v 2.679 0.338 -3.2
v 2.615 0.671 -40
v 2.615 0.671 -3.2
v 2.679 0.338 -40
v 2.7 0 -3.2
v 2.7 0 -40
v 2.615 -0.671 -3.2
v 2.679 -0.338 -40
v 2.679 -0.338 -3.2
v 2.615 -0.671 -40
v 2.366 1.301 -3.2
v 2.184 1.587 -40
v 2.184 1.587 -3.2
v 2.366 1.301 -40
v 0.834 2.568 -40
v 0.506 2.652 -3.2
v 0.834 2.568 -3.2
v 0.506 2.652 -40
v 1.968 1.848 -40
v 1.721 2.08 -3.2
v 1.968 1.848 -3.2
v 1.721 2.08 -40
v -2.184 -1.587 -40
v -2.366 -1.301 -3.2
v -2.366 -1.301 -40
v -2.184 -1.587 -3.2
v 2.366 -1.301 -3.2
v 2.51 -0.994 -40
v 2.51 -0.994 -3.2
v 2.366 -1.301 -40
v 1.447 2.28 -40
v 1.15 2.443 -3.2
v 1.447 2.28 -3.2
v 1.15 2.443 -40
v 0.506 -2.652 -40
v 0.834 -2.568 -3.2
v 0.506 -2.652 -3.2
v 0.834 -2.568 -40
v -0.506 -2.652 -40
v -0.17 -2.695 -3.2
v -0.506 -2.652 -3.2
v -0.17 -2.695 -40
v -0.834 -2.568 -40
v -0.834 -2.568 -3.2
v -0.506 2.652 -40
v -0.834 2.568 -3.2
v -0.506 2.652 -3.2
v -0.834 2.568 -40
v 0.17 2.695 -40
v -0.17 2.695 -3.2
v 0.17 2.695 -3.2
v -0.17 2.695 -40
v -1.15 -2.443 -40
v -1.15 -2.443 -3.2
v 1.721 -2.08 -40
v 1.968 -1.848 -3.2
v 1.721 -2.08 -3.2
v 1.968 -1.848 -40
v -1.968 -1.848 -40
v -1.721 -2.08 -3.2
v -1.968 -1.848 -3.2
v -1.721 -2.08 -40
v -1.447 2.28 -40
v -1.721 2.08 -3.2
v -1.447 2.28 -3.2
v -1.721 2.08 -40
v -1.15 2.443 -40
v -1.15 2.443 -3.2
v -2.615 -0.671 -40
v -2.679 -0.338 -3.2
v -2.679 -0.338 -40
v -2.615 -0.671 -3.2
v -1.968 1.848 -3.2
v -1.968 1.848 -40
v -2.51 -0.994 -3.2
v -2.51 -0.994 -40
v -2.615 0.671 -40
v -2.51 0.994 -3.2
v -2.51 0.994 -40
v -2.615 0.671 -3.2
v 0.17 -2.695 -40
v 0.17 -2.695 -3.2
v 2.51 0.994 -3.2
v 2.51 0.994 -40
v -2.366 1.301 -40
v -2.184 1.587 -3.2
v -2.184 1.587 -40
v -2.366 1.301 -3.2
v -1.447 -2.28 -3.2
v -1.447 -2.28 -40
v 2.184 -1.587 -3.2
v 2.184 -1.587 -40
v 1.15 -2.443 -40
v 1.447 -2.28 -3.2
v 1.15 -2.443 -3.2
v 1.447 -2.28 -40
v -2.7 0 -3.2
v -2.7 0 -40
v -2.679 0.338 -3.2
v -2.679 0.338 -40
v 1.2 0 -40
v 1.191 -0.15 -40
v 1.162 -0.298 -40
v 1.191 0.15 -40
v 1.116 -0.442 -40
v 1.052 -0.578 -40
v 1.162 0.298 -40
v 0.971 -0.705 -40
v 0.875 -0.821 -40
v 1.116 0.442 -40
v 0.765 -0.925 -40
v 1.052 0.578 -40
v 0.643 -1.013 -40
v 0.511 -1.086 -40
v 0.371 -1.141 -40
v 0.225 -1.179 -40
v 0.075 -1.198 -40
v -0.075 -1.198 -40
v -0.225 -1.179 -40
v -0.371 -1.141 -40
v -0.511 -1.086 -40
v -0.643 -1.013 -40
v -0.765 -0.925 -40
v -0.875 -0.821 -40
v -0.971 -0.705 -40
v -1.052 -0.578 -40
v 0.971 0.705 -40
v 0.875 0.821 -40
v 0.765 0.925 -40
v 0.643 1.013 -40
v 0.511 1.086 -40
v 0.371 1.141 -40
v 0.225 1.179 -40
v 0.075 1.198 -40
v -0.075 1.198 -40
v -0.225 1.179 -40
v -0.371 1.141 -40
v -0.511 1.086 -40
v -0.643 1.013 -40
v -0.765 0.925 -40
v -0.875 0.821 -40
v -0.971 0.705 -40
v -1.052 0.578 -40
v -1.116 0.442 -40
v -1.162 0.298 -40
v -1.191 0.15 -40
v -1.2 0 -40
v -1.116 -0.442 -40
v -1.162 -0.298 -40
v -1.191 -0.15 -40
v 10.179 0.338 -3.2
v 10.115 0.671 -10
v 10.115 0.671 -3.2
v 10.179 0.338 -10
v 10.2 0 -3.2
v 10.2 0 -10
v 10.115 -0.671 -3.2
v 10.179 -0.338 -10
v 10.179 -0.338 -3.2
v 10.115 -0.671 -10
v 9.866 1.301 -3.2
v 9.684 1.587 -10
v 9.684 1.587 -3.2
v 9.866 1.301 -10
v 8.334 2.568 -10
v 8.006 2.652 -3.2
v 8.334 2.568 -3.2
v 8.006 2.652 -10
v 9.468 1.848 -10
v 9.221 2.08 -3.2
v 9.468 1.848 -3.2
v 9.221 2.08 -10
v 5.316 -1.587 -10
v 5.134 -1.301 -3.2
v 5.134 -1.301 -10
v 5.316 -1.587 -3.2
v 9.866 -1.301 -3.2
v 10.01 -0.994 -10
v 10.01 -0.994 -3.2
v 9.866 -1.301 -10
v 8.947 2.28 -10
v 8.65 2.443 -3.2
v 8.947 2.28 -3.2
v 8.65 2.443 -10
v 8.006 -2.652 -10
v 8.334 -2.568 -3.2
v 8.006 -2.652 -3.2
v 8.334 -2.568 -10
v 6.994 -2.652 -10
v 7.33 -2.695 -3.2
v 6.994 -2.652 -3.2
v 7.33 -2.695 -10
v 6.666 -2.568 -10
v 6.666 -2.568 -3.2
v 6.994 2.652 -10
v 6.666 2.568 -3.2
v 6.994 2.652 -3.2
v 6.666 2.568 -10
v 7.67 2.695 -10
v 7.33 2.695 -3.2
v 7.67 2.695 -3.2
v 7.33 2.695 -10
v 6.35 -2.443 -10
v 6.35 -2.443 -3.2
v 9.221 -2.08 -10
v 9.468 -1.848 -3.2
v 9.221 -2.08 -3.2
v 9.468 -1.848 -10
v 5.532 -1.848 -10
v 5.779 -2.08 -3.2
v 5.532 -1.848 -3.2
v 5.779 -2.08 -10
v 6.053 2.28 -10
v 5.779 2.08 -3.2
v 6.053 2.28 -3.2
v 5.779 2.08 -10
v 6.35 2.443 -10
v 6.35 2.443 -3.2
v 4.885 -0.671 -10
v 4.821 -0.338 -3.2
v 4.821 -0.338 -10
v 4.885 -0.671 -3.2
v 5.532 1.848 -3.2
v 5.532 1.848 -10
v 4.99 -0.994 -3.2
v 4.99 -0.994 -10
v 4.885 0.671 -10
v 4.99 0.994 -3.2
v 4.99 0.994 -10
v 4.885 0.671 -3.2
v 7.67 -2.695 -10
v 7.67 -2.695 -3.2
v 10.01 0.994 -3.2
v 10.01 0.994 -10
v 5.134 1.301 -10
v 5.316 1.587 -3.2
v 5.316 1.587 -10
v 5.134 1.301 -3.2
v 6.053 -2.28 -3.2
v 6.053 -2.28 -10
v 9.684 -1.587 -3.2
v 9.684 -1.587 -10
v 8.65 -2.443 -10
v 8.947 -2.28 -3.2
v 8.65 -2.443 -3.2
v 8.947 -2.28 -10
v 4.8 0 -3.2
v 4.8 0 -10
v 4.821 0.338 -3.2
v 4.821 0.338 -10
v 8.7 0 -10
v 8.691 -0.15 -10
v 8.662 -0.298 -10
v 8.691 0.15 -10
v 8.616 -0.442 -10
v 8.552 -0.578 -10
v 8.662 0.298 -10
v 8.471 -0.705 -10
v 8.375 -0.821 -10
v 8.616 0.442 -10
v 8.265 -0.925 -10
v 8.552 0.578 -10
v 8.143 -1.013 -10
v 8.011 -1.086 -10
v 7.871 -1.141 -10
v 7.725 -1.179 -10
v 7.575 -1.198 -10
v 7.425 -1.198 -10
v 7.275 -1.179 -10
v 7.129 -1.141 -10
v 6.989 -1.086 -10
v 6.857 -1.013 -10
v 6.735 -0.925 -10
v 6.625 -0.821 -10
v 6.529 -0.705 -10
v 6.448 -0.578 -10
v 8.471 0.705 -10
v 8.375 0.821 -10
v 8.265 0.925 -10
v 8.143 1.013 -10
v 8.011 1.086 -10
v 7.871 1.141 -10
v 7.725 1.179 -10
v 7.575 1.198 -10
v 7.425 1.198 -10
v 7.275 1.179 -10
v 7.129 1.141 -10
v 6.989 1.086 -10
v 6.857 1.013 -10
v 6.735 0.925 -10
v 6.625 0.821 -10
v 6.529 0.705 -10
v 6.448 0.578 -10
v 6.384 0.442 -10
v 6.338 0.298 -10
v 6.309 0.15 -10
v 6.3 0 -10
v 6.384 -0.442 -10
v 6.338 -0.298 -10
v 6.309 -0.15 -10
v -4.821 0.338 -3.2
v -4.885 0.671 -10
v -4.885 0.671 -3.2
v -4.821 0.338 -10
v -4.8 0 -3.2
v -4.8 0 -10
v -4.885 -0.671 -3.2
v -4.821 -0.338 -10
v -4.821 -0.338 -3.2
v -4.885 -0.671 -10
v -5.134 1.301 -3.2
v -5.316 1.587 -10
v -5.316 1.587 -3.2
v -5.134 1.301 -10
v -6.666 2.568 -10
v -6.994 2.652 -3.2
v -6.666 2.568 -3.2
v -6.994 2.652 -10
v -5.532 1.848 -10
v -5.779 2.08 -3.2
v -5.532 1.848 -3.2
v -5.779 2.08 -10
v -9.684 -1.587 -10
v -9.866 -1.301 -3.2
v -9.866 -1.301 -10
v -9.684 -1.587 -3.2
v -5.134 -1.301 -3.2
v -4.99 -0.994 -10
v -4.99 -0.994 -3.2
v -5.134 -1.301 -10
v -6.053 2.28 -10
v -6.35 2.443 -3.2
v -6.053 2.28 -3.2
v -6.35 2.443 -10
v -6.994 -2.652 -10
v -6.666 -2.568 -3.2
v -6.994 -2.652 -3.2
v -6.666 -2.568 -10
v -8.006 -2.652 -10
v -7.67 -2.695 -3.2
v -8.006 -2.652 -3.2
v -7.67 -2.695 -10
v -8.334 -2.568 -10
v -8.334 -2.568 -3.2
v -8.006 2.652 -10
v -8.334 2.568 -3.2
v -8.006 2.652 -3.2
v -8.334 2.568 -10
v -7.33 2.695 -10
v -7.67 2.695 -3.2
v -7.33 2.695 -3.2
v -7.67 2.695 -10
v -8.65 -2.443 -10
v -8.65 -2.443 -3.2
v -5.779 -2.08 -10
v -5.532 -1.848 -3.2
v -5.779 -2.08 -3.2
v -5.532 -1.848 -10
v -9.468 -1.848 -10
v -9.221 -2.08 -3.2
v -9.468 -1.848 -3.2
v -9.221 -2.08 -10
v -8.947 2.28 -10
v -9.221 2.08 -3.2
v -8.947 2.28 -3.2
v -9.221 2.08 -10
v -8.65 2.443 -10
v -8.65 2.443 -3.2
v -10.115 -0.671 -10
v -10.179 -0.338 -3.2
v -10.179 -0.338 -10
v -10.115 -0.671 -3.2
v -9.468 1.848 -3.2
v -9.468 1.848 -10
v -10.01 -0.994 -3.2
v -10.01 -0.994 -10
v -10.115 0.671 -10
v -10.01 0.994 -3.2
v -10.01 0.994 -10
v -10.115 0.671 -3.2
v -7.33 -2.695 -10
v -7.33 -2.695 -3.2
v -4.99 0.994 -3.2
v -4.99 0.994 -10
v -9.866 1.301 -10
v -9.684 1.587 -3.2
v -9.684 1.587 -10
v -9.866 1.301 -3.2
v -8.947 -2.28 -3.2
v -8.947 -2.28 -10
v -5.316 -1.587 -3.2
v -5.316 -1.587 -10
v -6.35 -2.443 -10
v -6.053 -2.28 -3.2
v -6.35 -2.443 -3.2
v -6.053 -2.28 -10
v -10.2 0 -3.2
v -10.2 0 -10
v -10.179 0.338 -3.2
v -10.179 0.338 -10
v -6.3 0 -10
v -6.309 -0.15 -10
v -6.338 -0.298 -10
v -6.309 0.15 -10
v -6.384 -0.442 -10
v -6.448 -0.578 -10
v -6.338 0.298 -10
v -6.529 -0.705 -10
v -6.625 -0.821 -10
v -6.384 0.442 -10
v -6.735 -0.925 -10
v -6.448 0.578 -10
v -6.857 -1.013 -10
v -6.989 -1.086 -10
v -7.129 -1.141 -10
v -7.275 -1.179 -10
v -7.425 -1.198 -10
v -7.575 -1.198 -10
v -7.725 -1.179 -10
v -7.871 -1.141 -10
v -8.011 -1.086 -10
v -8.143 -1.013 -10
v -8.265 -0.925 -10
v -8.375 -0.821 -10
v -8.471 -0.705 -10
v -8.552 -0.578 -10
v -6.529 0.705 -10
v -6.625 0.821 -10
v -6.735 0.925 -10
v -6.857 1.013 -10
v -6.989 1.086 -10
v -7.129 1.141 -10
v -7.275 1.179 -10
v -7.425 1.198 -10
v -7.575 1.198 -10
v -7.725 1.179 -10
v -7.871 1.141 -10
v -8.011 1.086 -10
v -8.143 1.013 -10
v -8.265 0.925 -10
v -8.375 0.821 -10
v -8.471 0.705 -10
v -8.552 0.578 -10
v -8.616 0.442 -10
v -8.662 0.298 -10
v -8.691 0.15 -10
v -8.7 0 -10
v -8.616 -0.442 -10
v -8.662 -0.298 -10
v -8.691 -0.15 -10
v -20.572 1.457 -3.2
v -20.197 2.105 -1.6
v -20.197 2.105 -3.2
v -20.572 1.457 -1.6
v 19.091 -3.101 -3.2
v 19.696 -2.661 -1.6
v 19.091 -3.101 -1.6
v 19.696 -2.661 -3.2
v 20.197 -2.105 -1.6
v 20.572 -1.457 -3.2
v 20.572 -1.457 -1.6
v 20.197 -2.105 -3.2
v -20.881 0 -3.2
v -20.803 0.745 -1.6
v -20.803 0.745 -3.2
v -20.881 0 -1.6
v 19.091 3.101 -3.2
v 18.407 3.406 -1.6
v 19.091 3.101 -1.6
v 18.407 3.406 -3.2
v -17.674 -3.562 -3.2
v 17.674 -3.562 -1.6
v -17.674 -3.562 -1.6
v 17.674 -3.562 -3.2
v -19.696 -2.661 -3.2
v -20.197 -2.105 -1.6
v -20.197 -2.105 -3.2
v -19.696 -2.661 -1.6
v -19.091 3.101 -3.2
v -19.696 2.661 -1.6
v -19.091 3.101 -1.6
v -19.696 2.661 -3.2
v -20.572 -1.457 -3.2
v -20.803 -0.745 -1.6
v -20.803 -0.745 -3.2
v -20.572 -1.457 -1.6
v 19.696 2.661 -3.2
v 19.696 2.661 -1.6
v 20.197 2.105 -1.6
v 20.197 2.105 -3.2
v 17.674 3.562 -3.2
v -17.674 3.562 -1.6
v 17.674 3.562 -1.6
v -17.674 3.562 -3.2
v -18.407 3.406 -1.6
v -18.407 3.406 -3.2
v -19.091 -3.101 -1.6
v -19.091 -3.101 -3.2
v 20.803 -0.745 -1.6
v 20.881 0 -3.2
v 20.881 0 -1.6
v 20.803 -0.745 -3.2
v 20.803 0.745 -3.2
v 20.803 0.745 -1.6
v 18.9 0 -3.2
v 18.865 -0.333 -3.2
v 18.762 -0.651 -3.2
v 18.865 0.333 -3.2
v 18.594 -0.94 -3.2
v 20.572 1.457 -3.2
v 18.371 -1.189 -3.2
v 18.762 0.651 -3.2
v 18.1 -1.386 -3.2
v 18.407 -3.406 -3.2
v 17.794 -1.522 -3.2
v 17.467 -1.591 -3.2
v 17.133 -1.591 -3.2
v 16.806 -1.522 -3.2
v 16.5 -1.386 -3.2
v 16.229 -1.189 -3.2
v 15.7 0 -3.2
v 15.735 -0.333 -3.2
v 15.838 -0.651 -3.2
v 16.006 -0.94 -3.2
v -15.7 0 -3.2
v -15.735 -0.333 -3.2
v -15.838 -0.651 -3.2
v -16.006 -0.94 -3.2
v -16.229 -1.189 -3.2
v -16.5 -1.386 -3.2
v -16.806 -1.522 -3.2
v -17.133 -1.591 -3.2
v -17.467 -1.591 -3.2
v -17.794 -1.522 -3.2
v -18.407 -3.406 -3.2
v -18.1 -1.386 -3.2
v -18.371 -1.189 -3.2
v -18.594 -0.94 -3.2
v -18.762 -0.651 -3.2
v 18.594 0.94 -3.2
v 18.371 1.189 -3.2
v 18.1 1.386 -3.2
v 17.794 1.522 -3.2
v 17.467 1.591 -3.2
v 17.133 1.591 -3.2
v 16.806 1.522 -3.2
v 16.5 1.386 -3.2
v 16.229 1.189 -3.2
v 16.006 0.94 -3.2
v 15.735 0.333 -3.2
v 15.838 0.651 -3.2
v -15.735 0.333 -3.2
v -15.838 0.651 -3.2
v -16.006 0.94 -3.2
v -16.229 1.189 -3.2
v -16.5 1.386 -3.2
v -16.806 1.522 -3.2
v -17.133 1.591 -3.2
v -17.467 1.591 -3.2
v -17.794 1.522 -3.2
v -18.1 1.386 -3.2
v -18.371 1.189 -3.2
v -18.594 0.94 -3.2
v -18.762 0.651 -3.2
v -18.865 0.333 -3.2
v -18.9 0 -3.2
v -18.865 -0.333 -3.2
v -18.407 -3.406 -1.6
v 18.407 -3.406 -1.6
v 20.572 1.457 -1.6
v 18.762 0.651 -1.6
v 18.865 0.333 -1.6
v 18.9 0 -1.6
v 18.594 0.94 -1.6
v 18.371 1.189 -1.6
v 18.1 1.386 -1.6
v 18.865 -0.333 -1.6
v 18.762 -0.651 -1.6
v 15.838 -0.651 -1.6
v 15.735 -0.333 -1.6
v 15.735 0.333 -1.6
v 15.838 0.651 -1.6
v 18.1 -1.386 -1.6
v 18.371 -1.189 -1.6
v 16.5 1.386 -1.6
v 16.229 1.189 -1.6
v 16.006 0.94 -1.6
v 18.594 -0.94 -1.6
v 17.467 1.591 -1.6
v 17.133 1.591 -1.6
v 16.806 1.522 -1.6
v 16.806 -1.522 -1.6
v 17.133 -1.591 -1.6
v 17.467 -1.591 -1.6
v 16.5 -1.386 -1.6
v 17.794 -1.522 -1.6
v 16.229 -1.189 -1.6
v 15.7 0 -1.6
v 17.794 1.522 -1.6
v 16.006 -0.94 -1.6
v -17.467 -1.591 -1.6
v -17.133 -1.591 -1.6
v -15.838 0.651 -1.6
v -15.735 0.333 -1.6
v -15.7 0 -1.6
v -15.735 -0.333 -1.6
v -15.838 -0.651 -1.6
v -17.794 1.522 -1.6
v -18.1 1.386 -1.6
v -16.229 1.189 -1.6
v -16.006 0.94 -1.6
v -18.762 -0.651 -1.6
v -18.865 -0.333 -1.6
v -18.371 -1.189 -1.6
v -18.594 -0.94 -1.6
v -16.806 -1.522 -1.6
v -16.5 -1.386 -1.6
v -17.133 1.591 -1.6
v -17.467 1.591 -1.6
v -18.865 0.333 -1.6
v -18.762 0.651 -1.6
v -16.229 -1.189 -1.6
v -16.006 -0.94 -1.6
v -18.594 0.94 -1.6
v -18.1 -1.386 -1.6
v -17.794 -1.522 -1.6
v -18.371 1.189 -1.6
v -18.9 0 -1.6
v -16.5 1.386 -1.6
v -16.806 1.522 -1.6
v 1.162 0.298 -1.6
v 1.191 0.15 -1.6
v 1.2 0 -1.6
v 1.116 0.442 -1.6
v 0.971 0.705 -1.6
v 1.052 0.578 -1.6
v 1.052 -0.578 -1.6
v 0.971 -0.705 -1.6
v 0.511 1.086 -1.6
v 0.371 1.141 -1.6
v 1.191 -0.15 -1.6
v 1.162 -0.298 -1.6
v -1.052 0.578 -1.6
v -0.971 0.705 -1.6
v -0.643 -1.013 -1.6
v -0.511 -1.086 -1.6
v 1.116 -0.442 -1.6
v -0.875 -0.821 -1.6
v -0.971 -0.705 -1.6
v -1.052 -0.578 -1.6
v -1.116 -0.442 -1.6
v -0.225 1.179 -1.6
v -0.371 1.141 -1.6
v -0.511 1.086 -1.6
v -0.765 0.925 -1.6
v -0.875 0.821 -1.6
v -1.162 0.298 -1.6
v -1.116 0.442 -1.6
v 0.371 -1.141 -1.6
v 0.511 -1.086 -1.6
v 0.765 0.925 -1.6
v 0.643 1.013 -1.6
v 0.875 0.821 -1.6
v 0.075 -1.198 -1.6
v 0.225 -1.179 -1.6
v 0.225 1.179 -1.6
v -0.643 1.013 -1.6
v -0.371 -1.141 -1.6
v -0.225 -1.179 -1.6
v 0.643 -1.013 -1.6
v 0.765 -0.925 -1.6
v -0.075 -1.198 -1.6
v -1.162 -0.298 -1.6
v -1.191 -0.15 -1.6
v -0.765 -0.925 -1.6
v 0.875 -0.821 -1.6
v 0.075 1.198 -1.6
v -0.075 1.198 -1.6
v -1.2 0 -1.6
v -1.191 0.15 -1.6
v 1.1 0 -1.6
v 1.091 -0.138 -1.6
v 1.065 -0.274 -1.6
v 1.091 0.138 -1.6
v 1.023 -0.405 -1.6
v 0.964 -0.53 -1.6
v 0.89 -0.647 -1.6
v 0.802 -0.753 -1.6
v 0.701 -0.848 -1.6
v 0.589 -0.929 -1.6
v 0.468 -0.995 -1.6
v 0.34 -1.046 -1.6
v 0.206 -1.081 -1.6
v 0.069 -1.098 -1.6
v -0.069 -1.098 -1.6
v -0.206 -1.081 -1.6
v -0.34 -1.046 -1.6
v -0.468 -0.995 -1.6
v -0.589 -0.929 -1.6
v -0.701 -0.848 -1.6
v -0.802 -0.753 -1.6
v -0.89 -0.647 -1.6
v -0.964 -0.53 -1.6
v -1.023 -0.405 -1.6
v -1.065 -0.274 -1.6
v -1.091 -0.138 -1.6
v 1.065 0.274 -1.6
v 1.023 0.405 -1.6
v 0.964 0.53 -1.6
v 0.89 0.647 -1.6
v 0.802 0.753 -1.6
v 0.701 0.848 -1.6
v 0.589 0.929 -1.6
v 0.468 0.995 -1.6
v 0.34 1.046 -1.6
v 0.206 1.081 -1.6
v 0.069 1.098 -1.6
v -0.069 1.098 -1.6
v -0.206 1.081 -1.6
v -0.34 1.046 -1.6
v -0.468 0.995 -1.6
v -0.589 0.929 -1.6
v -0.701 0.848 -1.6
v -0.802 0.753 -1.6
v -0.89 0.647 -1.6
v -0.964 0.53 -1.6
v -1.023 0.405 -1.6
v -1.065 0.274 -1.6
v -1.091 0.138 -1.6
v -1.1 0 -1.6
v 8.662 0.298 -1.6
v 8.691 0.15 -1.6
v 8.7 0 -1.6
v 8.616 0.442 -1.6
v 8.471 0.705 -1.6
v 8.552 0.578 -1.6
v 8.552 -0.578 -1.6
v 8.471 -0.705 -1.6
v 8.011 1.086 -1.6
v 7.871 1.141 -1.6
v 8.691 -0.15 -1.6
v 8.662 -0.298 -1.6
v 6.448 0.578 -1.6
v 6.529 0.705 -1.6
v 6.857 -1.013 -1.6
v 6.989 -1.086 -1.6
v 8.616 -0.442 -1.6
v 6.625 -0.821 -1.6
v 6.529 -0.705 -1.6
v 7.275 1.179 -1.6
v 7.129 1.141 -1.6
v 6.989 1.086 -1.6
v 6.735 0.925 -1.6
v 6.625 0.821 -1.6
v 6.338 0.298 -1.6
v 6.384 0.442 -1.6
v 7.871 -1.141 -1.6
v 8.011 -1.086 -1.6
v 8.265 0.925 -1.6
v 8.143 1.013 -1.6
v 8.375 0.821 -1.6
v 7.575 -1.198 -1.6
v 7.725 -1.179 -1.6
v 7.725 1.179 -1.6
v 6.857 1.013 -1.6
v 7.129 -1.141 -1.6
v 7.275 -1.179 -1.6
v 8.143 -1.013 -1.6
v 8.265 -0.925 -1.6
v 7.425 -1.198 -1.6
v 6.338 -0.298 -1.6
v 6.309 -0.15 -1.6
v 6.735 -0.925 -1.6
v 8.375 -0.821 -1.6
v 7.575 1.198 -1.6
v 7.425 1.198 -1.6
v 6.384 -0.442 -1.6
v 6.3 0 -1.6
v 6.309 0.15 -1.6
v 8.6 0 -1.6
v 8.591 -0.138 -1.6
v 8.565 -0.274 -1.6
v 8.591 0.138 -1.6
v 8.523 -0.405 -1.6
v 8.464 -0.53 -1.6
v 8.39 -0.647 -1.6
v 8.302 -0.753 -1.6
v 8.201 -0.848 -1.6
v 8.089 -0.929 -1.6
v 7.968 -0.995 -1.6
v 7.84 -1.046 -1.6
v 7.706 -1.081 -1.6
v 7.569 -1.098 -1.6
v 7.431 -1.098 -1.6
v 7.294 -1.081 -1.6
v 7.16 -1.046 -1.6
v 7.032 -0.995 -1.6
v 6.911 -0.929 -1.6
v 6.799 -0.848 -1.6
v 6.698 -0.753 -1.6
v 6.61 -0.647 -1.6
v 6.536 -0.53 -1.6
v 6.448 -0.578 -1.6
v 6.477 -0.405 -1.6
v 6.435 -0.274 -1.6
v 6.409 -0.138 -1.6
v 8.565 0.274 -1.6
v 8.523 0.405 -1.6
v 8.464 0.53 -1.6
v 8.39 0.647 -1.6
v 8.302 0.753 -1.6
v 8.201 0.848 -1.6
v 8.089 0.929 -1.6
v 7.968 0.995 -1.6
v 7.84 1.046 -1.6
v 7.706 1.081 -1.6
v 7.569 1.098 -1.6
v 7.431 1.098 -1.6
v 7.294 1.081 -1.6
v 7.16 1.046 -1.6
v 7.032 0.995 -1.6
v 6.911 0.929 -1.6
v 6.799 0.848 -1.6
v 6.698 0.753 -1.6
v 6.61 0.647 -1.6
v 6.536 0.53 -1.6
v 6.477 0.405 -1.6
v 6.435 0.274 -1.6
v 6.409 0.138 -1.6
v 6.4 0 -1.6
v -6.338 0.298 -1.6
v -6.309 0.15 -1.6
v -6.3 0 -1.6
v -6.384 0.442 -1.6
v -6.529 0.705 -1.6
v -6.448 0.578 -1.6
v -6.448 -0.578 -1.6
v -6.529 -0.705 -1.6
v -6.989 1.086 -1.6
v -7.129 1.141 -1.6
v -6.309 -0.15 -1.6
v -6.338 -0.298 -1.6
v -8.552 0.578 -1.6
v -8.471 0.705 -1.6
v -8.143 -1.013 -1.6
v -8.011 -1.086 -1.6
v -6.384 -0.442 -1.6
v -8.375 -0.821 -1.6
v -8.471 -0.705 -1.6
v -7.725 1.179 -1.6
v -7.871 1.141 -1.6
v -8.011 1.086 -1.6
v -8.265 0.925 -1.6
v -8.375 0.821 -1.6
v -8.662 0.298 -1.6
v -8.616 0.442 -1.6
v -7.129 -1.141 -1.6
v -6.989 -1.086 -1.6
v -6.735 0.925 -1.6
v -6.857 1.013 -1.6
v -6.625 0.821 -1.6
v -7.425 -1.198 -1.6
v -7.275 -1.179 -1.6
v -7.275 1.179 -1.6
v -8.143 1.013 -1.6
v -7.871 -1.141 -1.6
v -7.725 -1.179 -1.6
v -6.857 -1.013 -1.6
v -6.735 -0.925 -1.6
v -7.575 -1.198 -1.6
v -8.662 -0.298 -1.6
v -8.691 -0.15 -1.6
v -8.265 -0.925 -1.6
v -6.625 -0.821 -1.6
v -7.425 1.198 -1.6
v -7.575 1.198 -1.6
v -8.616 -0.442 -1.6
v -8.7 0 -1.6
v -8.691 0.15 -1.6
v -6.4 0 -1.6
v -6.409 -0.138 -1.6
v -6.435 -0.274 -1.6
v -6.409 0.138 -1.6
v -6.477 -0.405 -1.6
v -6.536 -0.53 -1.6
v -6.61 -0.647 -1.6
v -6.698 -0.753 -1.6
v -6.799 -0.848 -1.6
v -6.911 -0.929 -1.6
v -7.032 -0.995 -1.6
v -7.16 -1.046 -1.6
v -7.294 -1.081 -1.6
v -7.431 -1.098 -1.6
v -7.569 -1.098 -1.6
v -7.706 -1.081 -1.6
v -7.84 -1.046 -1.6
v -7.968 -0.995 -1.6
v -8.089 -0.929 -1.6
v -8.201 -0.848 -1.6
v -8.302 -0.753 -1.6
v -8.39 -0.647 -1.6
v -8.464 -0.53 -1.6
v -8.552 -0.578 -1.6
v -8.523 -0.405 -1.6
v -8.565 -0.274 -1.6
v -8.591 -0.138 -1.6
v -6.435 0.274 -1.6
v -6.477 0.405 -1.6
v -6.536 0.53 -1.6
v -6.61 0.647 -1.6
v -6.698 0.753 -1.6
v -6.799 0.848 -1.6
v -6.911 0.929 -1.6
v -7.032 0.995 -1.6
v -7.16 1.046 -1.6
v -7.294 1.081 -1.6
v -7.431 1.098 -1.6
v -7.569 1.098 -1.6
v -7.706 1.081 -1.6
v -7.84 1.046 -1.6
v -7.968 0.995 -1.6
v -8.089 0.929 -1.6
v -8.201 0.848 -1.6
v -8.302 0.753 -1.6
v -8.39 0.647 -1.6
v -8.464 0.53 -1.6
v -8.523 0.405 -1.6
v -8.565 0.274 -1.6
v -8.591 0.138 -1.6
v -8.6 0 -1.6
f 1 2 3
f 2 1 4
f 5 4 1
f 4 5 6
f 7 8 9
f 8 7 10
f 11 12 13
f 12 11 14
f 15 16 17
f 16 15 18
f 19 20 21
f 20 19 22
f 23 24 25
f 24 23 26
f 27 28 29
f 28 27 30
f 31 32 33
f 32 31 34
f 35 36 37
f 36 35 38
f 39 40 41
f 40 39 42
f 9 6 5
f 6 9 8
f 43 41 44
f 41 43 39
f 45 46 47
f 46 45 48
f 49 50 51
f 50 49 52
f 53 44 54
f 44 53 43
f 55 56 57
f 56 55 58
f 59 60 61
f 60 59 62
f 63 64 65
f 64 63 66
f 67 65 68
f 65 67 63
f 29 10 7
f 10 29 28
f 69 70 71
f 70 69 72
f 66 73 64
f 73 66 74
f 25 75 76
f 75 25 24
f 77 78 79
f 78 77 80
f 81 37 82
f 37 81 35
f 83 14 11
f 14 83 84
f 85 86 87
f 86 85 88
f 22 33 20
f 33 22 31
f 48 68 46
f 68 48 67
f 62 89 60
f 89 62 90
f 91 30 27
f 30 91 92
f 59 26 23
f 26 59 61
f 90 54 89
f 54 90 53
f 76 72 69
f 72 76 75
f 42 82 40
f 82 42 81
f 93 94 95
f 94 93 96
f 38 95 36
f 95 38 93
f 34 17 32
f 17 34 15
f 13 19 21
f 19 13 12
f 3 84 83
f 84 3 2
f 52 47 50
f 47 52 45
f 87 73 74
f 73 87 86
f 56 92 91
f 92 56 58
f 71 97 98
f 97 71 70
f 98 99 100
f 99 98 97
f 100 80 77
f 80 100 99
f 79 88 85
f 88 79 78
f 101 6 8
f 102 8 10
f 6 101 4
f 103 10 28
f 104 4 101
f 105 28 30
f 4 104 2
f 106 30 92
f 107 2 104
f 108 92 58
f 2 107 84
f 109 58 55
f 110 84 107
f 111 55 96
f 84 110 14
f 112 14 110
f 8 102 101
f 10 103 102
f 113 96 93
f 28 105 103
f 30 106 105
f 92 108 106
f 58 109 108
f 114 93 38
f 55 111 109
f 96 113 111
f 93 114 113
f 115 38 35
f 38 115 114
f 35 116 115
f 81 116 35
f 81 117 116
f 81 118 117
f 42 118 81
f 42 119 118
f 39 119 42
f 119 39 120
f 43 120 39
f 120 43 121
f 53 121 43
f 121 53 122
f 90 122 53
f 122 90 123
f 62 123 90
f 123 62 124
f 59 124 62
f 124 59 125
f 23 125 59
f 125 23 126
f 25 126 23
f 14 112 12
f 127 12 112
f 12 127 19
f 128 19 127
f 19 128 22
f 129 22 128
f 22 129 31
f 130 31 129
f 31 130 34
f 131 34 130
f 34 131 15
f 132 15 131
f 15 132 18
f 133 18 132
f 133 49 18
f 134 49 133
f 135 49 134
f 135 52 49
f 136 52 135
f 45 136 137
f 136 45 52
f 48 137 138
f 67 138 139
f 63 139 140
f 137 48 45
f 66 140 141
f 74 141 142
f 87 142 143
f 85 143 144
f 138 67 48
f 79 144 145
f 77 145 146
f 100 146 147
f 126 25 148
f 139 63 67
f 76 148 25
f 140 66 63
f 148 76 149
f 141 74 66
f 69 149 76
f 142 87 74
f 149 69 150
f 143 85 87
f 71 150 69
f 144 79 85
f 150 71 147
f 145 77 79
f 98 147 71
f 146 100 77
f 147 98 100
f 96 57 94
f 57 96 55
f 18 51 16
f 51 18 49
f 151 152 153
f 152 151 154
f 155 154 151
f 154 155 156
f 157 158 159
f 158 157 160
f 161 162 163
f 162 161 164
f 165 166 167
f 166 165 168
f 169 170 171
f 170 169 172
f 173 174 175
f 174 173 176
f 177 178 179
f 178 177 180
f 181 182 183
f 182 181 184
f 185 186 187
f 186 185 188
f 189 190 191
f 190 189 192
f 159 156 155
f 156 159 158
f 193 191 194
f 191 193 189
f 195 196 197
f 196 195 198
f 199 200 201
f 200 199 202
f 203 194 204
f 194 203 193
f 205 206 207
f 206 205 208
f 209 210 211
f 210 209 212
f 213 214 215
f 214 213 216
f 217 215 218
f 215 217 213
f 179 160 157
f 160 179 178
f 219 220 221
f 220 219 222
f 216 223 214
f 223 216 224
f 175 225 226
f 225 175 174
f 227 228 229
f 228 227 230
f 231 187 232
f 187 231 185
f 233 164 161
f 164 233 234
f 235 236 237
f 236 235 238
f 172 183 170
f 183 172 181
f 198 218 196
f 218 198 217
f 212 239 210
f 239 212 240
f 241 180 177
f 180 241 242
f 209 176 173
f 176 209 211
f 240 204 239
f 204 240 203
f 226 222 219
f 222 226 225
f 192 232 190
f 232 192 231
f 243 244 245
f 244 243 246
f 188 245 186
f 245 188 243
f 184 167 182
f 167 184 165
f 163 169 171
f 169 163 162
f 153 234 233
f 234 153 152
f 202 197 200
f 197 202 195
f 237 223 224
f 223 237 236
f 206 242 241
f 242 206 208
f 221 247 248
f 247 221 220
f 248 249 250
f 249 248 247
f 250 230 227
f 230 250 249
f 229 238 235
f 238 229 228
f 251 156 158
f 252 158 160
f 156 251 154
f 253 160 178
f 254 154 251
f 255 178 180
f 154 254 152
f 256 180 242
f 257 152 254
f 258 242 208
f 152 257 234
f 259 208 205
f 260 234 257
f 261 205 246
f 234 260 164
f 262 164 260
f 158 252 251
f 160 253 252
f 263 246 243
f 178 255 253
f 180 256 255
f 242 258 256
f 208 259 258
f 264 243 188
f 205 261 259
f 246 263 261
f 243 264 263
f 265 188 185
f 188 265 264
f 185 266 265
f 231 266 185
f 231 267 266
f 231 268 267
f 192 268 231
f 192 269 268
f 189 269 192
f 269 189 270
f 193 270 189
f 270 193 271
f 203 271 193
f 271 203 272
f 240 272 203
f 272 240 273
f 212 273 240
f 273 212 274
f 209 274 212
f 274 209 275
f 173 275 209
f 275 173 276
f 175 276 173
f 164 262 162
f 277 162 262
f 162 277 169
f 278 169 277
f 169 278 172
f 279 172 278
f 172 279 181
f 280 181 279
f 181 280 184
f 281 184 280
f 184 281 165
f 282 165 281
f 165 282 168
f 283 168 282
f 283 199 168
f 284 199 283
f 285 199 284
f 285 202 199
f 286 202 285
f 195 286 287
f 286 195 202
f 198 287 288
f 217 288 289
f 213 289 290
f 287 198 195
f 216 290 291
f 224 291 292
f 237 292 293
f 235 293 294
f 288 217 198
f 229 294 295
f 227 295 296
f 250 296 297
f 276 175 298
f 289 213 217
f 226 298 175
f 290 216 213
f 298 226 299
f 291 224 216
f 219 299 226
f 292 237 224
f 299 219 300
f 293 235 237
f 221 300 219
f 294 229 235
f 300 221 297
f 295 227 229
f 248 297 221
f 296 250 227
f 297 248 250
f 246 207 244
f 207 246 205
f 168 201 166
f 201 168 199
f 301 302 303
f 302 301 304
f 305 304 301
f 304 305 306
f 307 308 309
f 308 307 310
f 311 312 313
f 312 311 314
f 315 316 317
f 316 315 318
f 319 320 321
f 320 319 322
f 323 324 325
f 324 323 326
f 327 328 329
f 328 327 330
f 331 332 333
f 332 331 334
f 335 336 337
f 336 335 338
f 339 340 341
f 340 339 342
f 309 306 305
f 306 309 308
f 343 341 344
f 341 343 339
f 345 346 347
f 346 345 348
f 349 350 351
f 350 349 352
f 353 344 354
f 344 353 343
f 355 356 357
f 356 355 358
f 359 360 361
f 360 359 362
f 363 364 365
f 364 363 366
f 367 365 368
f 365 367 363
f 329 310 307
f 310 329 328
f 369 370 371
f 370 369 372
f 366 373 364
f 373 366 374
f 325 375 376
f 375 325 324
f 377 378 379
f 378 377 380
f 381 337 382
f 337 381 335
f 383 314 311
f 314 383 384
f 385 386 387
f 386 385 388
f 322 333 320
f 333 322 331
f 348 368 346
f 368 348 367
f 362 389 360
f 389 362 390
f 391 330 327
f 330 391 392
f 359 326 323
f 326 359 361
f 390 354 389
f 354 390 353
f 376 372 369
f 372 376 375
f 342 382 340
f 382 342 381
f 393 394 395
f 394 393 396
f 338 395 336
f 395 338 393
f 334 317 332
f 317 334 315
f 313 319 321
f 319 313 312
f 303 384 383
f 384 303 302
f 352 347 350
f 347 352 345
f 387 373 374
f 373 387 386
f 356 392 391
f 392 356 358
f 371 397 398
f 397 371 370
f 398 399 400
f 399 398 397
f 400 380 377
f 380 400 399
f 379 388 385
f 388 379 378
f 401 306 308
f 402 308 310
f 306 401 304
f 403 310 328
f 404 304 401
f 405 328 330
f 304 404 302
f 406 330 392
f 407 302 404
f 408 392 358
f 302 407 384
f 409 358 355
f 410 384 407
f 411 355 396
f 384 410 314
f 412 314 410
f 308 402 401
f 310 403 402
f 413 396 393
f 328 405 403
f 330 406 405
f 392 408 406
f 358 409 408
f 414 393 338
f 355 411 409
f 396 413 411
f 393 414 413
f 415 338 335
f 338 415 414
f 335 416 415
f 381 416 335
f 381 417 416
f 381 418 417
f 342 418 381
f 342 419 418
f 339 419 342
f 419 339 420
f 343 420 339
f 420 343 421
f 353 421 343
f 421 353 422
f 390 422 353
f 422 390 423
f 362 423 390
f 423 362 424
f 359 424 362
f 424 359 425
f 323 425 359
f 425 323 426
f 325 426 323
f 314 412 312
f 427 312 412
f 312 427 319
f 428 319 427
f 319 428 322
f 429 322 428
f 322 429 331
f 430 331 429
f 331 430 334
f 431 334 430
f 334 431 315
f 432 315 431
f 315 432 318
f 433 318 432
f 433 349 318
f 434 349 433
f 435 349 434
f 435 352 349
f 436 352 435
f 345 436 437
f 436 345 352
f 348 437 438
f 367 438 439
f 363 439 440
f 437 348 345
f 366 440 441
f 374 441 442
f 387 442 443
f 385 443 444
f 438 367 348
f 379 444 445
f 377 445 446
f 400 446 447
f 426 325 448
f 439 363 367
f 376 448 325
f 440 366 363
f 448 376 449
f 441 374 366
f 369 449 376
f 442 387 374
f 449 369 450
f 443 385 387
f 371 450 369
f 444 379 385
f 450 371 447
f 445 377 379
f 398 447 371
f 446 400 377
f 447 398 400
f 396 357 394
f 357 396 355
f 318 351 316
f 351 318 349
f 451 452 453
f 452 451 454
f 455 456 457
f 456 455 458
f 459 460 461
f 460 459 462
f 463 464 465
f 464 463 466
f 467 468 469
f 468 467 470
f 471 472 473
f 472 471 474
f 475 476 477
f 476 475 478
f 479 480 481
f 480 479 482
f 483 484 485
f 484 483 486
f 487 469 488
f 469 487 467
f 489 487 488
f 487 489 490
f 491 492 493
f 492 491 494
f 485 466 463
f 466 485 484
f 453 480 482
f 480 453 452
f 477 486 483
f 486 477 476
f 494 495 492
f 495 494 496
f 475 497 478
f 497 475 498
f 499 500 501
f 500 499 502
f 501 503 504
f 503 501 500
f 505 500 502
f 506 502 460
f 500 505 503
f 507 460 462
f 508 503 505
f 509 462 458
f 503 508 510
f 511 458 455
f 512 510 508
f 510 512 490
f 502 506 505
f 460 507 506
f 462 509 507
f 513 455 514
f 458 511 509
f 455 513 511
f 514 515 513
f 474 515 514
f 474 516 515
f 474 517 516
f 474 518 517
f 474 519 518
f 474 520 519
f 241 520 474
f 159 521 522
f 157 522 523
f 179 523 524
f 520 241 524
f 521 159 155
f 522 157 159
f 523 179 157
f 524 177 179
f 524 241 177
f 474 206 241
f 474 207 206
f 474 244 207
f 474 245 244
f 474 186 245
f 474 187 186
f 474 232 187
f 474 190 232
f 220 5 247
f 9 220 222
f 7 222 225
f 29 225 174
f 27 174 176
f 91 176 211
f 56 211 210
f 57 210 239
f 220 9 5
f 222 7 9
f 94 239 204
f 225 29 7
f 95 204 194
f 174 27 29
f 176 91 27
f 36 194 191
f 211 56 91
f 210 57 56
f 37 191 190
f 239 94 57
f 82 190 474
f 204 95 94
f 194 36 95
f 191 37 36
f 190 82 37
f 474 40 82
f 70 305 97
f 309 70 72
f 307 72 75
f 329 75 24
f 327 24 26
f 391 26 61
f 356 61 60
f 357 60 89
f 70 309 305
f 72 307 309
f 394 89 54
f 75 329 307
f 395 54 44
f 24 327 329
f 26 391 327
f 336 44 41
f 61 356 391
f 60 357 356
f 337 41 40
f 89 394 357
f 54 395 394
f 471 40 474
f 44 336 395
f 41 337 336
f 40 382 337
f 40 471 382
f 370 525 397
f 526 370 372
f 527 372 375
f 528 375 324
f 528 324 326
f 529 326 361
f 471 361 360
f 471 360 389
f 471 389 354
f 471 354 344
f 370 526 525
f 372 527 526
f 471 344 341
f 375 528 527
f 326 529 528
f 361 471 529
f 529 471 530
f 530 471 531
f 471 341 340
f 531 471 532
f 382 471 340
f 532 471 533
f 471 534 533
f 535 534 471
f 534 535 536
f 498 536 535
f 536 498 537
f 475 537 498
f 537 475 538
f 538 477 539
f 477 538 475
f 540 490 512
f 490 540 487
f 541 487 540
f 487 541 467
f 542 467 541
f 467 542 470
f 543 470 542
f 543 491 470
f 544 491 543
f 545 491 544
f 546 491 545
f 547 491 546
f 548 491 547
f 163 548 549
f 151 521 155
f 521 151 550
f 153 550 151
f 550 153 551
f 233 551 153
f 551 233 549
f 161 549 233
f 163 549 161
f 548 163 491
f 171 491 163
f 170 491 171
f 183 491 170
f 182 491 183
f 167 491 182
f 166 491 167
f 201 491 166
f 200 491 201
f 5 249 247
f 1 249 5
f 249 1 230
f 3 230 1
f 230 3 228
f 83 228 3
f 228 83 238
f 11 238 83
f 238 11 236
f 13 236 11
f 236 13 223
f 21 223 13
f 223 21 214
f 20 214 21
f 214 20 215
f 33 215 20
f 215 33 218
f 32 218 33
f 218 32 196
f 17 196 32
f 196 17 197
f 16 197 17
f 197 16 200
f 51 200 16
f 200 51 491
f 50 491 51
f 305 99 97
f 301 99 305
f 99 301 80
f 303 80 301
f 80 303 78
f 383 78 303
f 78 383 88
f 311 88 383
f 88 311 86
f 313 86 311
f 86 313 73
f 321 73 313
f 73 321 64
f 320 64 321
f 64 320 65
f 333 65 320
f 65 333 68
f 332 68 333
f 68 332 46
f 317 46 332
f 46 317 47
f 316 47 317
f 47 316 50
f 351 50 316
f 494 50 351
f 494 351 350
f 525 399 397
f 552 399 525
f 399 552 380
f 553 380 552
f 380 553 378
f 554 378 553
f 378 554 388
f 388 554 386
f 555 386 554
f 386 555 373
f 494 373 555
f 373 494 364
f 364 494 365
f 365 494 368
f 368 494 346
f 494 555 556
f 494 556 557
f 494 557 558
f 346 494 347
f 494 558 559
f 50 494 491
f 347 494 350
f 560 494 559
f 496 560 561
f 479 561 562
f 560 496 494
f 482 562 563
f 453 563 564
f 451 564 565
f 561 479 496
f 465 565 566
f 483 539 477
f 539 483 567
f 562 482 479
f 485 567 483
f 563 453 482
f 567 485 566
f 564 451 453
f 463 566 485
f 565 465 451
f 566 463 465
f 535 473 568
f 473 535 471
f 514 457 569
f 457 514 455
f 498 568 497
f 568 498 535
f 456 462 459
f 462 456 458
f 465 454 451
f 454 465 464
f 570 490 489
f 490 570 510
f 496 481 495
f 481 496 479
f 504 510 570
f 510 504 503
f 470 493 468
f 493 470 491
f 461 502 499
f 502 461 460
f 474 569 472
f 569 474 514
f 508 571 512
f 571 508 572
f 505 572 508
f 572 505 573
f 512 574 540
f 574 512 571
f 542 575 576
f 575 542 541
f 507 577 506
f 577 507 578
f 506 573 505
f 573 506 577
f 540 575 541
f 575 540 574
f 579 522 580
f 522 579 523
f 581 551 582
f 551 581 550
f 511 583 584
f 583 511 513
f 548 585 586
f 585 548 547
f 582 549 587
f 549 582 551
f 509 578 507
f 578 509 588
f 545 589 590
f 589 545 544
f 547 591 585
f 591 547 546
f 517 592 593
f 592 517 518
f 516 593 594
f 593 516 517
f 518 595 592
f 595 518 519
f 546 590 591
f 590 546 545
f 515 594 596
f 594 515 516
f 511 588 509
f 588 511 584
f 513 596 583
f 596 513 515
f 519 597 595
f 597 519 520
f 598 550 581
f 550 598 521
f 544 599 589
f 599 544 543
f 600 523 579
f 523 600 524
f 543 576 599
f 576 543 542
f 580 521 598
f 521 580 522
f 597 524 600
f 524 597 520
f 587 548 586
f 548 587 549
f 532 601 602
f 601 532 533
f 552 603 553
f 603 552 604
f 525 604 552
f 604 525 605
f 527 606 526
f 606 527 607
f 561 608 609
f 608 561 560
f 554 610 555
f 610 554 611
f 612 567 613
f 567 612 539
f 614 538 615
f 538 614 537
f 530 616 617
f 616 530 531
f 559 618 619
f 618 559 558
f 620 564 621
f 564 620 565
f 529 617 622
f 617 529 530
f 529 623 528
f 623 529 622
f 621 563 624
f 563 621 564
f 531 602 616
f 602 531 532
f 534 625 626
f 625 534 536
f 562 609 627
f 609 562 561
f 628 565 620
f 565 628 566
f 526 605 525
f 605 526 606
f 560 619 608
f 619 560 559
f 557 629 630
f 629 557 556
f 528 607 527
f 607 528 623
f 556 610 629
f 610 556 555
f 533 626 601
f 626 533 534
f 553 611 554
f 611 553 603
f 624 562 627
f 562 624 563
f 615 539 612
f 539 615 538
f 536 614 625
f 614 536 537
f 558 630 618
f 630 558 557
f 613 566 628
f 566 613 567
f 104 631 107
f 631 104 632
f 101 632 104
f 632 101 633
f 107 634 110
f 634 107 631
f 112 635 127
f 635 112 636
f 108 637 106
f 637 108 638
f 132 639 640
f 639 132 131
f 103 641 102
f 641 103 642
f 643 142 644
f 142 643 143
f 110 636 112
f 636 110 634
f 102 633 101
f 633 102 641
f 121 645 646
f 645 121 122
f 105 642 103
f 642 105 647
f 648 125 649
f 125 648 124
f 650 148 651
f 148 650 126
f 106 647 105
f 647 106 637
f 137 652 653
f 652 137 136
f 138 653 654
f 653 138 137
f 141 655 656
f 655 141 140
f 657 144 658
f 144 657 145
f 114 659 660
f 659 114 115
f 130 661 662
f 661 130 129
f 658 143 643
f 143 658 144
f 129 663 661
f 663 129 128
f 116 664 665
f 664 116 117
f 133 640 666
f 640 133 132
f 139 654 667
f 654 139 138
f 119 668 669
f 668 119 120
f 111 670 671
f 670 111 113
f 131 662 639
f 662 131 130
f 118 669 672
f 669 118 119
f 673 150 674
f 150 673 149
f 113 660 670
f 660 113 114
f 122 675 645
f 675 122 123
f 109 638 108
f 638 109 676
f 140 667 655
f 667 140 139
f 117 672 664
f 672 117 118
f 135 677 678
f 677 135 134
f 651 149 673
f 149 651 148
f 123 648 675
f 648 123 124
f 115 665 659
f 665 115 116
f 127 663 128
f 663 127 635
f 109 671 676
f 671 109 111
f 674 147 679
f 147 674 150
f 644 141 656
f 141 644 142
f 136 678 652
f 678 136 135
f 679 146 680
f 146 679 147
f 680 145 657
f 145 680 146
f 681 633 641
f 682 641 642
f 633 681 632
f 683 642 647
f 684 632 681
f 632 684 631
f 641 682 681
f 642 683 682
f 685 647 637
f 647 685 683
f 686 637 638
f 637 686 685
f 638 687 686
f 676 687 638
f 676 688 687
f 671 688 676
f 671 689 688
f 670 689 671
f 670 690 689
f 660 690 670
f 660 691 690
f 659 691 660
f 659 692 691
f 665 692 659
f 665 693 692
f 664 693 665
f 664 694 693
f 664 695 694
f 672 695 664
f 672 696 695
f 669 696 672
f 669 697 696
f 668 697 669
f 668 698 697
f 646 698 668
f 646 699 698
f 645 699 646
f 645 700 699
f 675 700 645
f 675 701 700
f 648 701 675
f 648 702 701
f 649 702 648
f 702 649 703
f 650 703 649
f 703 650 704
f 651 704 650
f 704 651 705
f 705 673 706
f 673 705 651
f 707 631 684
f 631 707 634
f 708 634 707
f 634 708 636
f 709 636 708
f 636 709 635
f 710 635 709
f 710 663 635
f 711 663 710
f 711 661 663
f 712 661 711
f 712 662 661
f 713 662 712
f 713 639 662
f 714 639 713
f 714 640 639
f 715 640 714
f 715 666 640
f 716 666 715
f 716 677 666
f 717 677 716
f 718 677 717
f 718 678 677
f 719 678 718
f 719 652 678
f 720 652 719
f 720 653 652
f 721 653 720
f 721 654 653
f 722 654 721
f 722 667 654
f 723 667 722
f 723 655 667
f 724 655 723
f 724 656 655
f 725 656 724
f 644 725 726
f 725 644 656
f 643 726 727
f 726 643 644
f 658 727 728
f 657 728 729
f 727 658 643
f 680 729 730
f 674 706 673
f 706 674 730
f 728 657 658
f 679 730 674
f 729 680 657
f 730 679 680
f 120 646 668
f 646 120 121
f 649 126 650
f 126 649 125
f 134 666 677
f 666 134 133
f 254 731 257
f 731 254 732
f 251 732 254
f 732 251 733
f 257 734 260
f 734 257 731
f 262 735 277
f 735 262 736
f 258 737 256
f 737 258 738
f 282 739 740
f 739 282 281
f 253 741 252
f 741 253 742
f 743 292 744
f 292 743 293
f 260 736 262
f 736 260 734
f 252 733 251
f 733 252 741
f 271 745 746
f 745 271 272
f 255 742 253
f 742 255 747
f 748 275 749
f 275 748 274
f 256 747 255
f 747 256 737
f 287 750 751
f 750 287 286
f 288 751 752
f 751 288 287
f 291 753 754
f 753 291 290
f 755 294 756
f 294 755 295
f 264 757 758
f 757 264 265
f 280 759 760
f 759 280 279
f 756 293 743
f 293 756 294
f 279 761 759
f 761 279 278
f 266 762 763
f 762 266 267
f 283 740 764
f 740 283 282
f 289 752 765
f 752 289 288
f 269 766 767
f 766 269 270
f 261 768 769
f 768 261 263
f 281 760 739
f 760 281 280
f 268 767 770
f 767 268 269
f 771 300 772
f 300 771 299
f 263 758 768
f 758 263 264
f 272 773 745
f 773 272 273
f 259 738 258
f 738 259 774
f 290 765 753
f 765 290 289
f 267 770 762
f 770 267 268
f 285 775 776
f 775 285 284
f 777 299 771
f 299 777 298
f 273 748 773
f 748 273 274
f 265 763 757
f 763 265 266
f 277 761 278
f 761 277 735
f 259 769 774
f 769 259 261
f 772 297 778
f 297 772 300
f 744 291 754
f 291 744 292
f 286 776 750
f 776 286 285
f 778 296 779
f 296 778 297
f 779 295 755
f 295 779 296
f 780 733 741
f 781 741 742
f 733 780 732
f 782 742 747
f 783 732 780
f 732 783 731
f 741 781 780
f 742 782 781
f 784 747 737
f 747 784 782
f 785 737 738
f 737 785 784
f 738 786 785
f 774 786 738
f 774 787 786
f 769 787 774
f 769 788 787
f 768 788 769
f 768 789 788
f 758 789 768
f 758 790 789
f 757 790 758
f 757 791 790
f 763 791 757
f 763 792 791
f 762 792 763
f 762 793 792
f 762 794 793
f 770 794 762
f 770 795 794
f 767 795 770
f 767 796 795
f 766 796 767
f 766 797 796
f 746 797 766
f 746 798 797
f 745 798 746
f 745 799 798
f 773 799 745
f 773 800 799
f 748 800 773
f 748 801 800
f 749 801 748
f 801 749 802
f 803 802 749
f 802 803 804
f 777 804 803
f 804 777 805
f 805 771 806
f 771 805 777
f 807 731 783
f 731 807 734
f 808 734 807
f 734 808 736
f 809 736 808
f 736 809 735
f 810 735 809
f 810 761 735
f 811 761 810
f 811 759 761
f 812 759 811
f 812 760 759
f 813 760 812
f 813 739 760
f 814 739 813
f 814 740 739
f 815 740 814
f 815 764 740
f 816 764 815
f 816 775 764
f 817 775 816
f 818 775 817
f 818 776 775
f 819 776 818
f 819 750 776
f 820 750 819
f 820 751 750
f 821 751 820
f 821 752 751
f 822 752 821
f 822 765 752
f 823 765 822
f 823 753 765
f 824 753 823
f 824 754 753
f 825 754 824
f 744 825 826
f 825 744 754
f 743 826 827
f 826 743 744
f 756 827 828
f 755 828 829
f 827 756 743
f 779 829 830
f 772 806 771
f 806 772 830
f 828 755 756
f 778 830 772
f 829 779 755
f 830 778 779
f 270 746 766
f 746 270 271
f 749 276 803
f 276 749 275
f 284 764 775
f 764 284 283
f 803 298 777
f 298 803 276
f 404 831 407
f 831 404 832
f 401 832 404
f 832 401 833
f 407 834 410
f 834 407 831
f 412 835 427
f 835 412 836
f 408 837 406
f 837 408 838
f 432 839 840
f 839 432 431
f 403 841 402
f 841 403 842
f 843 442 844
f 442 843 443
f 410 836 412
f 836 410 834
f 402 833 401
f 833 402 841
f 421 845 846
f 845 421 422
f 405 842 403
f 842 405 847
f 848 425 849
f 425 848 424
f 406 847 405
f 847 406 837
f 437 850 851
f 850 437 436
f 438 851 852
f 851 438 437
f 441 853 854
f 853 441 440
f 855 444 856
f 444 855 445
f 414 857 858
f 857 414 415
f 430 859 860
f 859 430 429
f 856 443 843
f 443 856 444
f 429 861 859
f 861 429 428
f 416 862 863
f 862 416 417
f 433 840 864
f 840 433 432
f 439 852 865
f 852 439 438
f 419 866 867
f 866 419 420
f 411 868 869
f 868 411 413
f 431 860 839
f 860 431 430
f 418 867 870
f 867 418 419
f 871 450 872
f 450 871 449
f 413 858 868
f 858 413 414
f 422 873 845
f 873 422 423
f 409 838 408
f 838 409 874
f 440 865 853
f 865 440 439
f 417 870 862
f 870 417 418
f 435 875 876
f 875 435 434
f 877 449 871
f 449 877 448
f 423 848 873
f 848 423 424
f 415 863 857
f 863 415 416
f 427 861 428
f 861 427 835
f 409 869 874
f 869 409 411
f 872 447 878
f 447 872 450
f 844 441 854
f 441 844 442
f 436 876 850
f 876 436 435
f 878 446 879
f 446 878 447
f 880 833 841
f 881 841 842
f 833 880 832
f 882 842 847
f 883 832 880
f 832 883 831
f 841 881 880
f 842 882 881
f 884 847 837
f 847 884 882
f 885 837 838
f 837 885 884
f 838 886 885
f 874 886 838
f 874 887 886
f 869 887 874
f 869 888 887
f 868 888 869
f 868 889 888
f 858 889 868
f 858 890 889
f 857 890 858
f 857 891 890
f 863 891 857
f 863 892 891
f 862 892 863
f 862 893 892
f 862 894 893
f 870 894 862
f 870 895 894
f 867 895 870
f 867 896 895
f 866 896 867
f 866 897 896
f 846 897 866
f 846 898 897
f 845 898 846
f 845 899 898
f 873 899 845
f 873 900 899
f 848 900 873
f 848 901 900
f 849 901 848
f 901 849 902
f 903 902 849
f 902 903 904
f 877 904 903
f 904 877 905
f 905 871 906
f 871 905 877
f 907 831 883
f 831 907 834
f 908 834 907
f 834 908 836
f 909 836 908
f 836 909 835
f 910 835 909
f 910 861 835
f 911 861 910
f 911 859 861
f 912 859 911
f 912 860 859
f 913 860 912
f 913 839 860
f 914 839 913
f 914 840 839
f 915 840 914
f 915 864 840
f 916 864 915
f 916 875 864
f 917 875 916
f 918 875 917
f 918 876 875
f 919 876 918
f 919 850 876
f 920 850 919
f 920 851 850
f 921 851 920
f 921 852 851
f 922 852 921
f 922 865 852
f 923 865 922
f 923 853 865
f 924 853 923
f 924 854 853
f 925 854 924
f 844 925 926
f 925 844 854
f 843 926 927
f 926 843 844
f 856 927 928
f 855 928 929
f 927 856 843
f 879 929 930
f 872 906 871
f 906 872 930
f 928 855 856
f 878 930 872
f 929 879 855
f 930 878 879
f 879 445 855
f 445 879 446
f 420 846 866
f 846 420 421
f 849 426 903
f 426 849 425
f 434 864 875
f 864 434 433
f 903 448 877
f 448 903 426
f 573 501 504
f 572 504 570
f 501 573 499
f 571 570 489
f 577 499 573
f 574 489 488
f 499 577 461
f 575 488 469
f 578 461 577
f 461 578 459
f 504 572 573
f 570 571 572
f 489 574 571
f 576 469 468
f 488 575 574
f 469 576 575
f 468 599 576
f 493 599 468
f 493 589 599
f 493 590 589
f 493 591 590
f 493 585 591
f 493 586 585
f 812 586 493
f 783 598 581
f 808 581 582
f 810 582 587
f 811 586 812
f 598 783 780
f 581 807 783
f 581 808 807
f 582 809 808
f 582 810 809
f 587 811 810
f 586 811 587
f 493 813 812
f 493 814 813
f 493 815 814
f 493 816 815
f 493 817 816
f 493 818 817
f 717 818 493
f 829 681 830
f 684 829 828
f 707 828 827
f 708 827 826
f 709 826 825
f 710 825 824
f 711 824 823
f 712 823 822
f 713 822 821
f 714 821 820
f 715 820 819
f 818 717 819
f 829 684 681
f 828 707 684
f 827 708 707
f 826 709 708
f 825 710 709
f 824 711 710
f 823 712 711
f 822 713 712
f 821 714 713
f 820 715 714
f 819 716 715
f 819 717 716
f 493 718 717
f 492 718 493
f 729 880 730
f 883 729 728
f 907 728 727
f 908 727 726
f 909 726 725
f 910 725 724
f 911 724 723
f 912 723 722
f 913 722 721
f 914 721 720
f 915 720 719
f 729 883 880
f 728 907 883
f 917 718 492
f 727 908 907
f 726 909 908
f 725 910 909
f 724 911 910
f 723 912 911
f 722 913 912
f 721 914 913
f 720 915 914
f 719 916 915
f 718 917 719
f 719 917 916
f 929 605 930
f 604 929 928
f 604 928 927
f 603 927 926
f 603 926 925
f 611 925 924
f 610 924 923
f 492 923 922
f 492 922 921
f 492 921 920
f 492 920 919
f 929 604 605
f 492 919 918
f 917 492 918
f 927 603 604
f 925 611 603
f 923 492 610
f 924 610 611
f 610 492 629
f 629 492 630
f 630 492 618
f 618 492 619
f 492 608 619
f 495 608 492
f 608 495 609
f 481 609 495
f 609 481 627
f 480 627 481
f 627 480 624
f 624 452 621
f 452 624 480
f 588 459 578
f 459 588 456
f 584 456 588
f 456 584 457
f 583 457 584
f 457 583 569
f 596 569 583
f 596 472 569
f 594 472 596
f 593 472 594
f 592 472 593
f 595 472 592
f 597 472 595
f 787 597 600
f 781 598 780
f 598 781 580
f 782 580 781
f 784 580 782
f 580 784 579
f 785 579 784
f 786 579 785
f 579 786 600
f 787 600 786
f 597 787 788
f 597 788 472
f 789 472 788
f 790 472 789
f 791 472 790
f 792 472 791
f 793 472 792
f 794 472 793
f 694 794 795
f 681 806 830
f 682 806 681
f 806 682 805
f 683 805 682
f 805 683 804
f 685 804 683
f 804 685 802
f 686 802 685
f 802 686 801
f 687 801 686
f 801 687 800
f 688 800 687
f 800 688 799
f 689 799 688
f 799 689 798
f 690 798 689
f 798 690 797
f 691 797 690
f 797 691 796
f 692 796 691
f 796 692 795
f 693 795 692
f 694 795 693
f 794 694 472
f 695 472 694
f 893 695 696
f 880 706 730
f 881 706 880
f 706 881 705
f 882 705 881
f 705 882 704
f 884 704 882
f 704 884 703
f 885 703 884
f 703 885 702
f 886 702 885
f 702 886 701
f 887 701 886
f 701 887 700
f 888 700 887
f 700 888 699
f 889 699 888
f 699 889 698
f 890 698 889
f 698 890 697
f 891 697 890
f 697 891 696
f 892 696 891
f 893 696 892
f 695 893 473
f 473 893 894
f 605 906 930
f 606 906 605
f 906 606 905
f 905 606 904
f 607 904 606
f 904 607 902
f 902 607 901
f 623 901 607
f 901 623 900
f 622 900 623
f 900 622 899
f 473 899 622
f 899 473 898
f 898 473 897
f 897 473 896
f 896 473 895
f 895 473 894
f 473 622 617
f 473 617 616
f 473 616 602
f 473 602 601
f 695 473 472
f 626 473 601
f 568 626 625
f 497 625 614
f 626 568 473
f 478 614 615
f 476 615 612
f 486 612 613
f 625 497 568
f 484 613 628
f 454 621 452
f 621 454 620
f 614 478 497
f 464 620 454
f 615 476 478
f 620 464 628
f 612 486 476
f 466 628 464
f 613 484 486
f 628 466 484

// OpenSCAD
//1 = top
//2 = middle
//3 = bottom
//anything else = all
// You must render and print all 3
part = 3;

stopper_height = 20;
stopper_d1 = 20;
stopper_d2 = 25;
sstube_d = 2.2;
shell_thickness = 1.6;
sstube_loc = [[0,0],[7.5,0],[-7.5,0]];
sstube_len = [40,10,10]; //tube length below stopper
screw_hole_d = 0.156*25.4; 

//derived
shell_t = shell_thickness; //shortcut
outer_diameter = stopper_d2+2*shell_t;
intersection() {
	difference() {
		union() {
			if (part != 3) {//shouldn't need this but i do.
				translate([0, 0,-shell_t]) 
					cylinder(h=stopper_height+shell_t, d=outer_diameter, $fn=50);
			}
			sstube_holes(sstube_loc,sstube_len,sstube_d+2*shell_t);
			translate([0,0,-2*shell_t]) clampy_part();
		}
		//stopper
		cylinder(h=stopper_height, d1=stopper_d1,d2=stopper_d2, $fn=100);
		//ss tube holes
		sstube_holes(sstube_loc,sstube_len,sstube_d);
		//make most of the tube holes a bit bigger.
		translate([0,0,-shell_t]) sstube_holes(sstube_loc,sstube_len,sstube_d+0.2);
	}
	if (part == 1) {
		cylinder(h=300,r=300);
	}
	if (part == 2) {
		translate([0, 0, -shell_t])
		cylinder(h=shell_t,r=300);
	}
	if (part == 3) {
		translate([0, 0, -shell_t]) mirror([0,0,1])
		cylinder(h=300,r=300);
	}
}

module sstube_holes(loc,t_len,thick) {
	mirror([0,0,1])
	for (ii = [0:len(loc)]){ 
		translate(loc[ii]) 
		  cylinder(h=t_len[ii] , d=thick, $fn=50);
	}
}

module clampy_part() {
	$fn=30;
	difference() {
		hull() {
			translate([2*shell_t+(outer_diameter)/2,0])
			cylinder(h=3*shell_t,d=screw_hole_d+2*shell_t);
			translate([-(2*shell_t+(outer_diameter)/2),0])
			cylinder(h=3*shell_t,d=screw_hole_d+2*shell_t);
		}
		translate([2*shell_t+(outer_diameter)/2,0])
		cylinder(h=3*shell_t,d=2*shell_t);
		translate([-(2*shell_t+(outer_diameter)/2),0])
		cylinder(h=3*shell_t,d=2*shell_t);
	}
}
